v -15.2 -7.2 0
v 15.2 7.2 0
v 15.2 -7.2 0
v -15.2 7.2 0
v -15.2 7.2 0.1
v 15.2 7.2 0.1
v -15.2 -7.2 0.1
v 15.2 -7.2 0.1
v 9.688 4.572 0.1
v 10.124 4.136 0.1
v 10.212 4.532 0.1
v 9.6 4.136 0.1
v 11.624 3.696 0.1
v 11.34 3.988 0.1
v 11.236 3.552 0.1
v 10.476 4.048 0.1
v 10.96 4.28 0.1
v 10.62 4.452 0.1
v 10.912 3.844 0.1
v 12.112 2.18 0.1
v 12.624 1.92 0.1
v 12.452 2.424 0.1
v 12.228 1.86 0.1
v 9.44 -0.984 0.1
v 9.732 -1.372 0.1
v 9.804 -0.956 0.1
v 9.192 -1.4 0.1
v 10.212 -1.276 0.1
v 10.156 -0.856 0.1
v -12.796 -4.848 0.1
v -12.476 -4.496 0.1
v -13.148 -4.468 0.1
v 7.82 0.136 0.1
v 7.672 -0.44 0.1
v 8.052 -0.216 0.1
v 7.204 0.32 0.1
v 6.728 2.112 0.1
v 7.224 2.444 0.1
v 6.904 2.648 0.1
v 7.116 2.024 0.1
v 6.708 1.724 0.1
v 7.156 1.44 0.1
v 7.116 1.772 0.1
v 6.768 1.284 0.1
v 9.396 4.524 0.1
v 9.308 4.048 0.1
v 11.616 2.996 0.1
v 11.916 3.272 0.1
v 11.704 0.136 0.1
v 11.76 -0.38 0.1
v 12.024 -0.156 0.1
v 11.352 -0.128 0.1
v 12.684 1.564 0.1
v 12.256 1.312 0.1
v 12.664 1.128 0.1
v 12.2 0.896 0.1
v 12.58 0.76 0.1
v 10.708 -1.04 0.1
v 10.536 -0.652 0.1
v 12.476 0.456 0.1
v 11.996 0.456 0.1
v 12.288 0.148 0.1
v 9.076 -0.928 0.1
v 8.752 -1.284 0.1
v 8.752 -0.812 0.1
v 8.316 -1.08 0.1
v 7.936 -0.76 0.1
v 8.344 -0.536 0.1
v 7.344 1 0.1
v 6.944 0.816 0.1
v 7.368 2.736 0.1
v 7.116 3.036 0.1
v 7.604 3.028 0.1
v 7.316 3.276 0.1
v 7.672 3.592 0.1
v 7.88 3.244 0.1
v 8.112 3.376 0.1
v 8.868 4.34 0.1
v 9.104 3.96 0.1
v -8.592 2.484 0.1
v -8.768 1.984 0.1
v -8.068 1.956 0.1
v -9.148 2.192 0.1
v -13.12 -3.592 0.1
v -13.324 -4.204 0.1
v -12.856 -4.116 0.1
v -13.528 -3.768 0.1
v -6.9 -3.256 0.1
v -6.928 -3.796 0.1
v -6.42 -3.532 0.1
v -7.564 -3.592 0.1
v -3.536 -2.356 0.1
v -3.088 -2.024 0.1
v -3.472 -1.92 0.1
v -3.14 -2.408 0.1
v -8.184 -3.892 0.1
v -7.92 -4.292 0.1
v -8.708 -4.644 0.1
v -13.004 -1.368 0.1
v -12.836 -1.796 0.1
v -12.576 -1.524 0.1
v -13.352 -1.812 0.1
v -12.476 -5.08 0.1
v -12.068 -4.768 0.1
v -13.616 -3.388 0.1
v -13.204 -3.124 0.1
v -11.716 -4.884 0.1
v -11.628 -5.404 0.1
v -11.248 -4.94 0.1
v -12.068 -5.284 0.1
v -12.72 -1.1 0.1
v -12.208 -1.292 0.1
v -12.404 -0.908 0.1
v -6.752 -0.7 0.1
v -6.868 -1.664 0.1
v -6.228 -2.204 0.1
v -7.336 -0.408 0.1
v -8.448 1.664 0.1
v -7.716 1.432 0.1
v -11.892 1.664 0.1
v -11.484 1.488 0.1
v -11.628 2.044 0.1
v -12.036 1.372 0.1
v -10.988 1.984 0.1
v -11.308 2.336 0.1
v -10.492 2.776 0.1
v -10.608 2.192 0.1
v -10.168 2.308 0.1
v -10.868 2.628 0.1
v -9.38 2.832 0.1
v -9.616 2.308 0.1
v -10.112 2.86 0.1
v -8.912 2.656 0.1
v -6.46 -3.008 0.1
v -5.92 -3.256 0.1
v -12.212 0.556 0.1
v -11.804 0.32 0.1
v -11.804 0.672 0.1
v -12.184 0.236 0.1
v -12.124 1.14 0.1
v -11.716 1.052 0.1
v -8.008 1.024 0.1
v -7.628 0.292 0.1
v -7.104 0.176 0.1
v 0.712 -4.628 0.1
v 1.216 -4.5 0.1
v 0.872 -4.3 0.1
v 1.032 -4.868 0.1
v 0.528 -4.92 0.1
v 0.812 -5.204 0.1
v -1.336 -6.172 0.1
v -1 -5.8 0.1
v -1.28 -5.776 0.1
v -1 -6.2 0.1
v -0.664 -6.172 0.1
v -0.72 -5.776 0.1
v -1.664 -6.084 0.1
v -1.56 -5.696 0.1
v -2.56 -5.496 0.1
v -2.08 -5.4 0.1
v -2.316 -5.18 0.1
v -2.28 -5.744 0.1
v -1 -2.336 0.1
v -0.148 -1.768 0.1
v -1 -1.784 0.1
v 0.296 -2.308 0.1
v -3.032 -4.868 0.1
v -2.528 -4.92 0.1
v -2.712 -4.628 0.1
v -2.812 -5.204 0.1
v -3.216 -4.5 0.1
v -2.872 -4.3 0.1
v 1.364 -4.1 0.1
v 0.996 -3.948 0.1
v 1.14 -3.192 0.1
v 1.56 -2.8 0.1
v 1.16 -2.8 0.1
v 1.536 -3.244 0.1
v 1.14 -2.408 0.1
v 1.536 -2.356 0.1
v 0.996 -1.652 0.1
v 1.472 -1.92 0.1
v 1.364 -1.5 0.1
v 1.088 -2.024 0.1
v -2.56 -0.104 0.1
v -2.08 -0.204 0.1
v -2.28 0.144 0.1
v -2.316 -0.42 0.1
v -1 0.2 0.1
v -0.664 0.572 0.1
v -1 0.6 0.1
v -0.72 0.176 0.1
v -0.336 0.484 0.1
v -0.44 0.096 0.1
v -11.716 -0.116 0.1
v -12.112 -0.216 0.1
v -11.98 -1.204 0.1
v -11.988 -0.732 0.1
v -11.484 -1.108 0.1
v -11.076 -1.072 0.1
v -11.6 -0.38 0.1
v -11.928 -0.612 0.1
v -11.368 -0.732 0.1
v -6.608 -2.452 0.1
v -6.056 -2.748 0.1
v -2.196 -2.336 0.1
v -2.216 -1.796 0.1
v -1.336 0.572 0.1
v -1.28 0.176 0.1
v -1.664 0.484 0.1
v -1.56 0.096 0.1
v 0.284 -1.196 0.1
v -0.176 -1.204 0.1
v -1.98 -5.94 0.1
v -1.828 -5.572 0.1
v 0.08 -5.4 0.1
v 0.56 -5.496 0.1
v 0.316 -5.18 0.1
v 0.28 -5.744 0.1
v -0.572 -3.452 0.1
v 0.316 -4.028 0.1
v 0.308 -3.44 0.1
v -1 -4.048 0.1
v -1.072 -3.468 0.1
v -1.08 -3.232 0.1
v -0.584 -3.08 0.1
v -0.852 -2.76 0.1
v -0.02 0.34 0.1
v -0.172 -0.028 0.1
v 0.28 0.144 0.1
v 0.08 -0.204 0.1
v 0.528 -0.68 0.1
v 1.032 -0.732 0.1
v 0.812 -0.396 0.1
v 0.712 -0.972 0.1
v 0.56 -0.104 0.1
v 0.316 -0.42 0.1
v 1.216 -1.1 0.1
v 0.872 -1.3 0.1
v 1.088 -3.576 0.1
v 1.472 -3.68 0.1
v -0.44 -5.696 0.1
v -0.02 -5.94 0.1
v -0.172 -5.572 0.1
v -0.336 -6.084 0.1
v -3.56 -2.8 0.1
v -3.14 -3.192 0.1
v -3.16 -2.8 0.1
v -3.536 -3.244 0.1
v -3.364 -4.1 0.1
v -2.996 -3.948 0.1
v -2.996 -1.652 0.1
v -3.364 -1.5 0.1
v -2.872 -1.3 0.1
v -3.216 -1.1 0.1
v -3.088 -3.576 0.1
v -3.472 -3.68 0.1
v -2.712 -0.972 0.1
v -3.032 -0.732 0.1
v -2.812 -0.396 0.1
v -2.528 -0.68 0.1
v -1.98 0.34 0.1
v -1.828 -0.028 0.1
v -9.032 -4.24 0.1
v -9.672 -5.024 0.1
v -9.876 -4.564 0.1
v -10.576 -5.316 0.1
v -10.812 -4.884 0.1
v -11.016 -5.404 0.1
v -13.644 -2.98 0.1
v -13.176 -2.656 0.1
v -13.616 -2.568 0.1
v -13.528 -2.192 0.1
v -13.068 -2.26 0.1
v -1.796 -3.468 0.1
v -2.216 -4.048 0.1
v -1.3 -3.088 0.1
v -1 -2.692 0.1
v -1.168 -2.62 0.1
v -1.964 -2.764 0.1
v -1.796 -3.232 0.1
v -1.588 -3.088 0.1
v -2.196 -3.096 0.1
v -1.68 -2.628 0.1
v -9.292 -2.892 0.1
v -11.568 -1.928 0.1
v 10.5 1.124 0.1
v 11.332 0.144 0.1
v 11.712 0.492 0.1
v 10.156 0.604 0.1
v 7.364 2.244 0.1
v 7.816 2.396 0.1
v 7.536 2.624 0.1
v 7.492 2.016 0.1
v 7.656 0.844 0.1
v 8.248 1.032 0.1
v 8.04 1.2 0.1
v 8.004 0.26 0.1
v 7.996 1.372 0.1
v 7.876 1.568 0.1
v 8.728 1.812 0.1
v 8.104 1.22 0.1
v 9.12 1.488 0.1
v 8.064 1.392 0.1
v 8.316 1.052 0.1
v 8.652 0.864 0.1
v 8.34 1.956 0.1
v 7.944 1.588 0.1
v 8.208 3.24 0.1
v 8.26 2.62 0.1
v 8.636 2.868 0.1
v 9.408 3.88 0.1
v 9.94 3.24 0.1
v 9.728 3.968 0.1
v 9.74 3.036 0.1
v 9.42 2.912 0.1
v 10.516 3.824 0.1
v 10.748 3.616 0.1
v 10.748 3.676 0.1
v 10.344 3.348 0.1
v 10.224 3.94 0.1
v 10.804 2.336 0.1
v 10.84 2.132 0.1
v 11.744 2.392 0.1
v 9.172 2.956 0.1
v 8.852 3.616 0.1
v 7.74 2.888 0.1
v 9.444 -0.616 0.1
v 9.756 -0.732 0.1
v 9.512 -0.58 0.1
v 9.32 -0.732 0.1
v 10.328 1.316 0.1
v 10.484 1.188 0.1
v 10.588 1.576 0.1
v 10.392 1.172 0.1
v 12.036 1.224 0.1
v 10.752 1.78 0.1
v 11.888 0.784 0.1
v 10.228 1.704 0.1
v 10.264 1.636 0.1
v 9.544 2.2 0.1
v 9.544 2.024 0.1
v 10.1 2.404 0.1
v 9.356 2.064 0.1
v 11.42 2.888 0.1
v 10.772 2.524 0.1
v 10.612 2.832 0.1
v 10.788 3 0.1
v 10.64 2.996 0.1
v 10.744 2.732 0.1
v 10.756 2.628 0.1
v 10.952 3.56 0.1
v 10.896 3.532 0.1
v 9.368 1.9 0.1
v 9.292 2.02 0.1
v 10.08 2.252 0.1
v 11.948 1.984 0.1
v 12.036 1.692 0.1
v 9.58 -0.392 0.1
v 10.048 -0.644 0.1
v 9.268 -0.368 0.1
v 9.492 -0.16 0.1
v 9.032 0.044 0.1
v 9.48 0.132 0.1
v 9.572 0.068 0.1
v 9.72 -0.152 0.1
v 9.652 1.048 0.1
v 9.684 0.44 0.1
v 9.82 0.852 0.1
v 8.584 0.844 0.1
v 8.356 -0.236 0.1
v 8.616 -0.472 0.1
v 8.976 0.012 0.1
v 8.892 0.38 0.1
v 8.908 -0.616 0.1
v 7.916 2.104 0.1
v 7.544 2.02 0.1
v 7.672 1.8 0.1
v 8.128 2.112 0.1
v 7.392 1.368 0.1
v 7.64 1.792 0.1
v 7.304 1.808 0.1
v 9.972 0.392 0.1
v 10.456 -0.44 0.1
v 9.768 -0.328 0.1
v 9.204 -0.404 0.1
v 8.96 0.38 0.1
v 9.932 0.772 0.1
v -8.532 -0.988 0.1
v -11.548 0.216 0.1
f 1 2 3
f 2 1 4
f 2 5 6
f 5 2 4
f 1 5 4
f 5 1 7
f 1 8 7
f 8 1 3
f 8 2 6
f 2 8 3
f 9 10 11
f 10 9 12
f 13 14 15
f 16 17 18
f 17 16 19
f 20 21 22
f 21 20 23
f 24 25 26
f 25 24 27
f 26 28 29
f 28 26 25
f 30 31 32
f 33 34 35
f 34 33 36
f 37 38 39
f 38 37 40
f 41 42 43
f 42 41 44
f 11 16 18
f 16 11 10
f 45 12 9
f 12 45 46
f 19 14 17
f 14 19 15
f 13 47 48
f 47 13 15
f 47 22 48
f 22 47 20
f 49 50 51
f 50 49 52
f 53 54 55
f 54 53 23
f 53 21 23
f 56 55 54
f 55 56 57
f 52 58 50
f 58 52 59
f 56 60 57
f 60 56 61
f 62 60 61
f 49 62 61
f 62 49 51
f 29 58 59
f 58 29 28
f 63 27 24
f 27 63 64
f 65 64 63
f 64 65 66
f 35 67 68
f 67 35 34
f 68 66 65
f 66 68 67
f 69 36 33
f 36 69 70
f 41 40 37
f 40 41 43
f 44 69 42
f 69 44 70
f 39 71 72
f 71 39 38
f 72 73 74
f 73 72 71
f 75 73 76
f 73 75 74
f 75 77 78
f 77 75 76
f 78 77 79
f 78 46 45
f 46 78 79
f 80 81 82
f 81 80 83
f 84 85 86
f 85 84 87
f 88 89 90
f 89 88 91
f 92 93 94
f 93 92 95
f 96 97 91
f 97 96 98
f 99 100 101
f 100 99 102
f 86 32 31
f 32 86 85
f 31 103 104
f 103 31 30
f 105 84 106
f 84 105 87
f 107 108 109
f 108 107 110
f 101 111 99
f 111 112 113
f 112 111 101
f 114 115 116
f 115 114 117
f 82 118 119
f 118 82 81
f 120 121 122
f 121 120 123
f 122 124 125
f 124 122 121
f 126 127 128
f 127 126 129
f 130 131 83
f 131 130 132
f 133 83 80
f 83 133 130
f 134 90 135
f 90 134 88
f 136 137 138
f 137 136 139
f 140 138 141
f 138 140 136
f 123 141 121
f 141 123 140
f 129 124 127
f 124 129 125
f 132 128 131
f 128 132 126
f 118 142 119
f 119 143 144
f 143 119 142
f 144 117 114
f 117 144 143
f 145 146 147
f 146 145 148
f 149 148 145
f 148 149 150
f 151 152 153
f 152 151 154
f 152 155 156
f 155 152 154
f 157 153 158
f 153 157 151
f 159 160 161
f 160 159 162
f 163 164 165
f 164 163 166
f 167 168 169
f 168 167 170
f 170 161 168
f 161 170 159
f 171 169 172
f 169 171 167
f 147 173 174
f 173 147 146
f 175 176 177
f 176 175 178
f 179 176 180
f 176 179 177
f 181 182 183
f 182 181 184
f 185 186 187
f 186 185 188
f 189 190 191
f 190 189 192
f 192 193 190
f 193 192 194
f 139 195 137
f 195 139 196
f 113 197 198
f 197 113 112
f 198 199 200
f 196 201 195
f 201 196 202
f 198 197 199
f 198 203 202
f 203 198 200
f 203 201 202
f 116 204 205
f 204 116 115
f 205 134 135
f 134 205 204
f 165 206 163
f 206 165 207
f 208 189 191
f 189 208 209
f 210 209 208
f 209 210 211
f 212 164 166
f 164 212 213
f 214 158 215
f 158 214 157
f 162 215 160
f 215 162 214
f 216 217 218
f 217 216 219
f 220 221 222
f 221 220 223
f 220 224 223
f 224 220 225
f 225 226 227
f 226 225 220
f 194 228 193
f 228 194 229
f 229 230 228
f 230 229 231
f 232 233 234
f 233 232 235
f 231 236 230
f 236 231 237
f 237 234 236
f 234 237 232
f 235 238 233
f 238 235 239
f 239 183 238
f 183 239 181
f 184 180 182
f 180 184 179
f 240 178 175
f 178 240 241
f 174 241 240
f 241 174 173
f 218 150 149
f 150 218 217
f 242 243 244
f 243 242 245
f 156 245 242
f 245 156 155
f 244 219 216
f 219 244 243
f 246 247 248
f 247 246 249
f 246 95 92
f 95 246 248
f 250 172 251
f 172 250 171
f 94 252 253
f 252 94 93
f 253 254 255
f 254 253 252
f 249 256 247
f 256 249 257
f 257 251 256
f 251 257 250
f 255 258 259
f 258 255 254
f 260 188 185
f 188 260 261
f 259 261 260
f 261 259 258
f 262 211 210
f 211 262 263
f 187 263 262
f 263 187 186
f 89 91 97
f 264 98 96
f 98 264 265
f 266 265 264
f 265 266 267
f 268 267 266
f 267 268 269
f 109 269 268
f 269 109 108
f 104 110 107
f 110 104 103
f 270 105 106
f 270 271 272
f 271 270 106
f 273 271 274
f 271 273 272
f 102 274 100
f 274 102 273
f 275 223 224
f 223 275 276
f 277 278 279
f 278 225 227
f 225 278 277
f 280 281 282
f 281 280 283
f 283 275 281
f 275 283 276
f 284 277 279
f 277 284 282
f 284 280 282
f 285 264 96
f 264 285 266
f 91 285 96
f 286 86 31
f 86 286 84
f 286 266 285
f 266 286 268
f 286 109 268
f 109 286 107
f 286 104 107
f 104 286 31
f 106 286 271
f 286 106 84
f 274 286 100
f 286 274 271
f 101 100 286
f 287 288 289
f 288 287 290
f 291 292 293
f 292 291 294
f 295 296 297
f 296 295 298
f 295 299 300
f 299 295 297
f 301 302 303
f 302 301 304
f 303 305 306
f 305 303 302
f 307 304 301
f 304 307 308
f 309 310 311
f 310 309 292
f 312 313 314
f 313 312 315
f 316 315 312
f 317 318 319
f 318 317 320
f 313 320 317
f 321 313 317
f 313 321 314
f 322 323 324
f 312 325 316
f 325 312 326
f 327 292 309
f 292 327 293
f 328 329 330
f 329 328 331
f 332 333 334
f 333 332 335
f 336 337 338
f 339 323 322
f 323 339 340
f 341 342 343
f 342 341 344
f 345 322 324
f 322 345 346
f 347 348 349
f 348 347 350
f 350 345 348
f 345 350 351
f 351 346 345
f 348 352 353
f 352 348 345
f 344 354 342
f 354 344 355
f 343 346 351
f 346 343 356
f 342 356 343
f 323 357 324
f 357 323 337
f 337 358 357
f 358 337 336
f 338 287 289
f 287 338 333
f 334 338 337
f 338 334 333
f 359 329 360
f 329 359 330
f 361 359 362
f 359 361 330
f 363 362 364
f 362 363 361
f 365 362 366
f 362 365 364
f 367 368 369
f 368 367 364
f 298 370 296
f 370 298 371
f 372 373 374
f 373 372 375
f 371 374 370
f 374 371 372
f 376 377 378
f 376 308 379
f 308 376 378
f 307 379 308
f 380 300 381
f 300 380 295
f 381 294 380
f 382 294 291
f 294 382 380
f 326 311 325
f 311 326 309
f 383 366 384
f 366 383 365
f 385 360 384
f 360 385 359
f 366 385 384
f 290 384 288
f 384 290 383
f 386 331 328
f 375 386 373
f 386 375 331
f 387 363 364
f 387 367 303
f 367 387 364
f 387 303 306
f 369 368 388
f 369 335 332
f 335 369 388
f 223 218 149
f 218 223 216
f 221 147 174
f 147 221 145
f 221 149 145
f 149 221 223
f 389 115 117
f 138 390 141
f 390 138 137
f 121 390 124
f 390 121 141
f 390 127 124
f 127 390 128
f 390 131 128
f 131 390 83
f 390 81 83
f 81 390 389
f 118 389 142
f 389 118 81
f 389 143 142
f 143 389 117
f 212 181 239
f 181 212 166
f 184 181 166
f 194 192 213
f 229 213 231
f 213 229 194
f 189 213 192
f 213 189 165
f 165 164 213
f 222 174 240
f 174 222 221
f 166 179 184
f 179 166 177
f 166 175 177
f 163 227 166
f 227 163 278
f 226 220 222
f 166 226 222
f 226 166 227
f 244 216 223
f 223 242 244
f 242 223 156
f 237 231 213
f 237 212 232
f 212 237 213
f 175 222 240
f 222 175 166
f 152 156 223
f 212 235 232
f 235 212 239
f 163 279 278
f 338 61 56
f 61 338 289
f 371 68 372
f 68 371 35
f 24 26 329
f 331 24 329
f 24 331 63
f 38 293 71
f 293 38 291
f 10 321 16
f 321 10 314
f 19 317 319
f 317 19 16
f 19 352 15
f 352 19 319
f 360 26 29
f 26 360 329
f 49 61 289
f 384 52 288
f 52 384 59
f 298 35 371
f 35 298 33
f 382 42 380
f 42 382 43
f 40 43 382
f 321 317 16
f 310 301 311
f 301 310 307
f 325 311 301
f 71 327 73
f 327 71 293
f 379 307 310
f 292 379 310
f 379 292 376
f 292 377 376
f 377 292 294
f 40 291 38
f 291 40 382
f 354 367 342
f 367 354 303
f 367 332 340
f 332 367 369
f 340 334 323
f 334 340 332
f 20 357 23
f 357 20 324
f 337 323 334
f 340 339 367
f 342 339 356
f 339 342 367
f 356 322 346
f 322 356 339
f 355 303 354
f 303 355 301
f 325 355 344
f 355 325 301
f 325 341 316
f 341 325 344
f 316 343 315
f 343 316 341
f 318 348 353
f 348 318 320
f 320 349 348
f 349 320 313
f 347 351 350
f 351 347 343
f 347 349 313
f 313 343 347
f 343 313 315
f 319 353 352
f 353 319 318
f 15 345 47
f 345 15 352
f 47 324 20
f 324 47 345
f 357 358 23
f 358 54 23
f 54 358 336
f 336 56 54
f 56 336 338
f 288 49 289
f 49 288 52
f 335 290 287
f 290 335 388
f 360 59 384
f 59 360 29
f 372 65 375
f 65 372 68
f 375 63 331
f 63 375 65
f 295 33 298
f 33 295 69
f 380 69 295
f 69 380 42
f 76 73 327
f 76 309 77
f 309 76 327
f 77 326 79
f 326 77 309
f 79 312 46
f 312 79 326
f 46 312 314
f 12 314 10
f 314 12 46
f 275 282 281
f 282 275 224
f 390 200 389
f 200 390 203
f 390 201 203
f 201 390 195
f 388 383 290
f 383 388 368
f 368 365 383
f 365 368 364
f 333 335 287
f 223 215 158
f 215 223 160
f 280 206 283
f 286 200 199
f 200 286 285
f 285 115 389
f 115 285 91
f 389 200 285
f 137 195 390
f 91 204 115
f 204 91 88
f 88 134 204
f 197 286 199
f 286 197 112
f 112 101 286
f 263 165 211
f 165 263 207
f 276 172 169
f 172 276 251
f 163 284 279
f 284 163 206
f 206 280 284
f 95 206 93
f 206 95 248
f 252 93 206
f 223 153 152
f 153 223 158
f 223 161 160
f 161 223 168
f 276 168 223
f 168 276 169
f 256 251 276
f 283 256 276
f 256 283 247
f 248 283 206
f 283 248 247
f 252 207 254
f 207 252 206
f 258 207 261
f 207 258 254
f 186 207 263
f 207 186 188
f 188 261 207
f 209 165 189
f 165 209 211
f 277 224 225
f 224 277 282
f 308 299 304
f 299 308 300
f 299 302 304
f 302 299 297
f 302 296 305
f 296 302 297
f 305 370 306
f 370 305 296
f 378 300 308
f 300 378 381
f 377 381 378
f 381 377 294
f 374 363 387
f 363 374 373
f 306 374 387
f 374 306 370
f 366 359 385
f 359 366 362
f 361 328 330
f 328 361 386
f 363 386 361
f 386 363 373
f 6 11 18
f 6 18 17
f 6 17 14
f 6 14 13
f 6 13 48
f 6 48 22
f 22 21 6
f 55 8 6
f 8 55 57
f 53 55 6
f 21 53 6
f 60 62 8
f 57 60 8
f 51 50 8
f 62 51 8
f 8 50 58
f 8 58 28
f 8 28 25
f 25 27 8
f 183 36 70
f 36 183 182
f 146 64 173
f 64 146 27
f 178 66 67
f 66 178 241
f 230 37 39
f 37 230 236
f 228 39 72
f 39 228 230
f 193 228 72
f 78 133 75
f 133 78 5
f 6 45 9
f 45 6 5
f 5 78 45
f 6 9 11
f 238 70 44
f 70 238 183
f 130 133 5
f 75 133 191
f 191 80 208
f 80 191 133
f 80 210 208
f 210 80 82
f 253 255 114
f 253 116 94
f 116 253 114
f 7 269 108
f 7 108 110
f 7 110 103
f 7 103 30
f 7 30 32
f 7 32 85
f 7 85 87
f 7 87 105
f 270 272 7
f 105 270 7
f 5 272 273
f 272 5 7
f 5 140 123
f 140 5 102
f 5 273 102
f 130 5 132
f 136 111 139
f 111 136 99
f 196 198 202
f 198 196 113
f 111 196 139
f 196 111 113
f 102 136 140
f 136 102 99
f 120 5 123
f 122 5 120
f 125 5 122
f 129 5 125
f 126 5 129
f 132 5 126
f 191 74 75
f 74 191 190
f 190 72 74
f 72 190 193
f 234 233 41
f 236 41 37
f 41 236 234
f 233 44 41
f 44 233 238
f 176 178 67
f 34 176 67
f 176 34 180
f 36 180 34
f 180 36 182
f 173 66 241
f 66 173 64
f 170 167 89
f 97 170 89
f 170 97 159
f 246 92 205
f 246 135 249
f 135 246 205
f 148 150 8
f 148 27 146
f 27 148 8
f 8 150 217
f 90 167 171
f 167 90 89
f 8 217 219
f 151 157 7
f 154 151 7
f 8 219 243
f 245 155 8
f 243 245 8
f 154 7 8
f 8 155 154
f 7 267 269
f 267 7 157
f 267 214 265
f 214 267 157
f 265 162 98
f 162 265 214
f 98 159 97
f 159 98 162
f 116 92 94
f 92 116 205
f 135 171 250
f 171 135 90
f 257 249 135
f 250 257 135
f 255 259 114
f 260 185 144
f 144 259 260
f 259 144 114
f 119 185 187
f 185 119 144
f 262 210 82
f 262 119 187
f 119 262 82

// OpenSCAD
use <../lib.scad>
use <6296256b.scad>
function ldraw_lib__6372023b() = [
// 0 =Sticker  1.8 x  3.8 with Italy, Poland and Matterhorn Stickers on Medium Nougat
// 0 Name: 6372023b.dat
// 0 Author: Magnus Forsberg [MagFors]
// 0 !LDRAW_ORG Part Alias UPDATE 2024-06
// 0 !LICENSE Licensed under CC BY 4.0 : see CAreadme.txt
// 
// 0 BFC CERTIFY CCW
  [0,"BFC","CERTIFY"],
  [0,"BFC","CCW"],
// 
// 0 !KEYWORDS 500, Bricklink 77942stk01, Brickowl 1064764, Cinquecento, FIAT
// 0 !KEYWORDS Nuova, Rebrickable 83460, set 77942
// 
// 0 !HISTORY 2024-07-29 [OrionP] Official Update 2024-06
// 
// 
// 1 16 0 0 0 1 0 0 0 1 0 0 0 1 6296256b.dat
  [1,16,0,0,0,1,0,0,0,1,0,0,0,1, ldraw_lib__6296256b()],
];
module ldraw_lib__6372023b(step=0, col=false, unit=2/5, alt=false, line=0.2, solid=!$preview)
    makepoly(ldraw_lib__6372023b(), step=step, col=col, unit=unit, alt=alt, line=line, solid=solid);
ldraw_lib__6372023b(line=0.2);
